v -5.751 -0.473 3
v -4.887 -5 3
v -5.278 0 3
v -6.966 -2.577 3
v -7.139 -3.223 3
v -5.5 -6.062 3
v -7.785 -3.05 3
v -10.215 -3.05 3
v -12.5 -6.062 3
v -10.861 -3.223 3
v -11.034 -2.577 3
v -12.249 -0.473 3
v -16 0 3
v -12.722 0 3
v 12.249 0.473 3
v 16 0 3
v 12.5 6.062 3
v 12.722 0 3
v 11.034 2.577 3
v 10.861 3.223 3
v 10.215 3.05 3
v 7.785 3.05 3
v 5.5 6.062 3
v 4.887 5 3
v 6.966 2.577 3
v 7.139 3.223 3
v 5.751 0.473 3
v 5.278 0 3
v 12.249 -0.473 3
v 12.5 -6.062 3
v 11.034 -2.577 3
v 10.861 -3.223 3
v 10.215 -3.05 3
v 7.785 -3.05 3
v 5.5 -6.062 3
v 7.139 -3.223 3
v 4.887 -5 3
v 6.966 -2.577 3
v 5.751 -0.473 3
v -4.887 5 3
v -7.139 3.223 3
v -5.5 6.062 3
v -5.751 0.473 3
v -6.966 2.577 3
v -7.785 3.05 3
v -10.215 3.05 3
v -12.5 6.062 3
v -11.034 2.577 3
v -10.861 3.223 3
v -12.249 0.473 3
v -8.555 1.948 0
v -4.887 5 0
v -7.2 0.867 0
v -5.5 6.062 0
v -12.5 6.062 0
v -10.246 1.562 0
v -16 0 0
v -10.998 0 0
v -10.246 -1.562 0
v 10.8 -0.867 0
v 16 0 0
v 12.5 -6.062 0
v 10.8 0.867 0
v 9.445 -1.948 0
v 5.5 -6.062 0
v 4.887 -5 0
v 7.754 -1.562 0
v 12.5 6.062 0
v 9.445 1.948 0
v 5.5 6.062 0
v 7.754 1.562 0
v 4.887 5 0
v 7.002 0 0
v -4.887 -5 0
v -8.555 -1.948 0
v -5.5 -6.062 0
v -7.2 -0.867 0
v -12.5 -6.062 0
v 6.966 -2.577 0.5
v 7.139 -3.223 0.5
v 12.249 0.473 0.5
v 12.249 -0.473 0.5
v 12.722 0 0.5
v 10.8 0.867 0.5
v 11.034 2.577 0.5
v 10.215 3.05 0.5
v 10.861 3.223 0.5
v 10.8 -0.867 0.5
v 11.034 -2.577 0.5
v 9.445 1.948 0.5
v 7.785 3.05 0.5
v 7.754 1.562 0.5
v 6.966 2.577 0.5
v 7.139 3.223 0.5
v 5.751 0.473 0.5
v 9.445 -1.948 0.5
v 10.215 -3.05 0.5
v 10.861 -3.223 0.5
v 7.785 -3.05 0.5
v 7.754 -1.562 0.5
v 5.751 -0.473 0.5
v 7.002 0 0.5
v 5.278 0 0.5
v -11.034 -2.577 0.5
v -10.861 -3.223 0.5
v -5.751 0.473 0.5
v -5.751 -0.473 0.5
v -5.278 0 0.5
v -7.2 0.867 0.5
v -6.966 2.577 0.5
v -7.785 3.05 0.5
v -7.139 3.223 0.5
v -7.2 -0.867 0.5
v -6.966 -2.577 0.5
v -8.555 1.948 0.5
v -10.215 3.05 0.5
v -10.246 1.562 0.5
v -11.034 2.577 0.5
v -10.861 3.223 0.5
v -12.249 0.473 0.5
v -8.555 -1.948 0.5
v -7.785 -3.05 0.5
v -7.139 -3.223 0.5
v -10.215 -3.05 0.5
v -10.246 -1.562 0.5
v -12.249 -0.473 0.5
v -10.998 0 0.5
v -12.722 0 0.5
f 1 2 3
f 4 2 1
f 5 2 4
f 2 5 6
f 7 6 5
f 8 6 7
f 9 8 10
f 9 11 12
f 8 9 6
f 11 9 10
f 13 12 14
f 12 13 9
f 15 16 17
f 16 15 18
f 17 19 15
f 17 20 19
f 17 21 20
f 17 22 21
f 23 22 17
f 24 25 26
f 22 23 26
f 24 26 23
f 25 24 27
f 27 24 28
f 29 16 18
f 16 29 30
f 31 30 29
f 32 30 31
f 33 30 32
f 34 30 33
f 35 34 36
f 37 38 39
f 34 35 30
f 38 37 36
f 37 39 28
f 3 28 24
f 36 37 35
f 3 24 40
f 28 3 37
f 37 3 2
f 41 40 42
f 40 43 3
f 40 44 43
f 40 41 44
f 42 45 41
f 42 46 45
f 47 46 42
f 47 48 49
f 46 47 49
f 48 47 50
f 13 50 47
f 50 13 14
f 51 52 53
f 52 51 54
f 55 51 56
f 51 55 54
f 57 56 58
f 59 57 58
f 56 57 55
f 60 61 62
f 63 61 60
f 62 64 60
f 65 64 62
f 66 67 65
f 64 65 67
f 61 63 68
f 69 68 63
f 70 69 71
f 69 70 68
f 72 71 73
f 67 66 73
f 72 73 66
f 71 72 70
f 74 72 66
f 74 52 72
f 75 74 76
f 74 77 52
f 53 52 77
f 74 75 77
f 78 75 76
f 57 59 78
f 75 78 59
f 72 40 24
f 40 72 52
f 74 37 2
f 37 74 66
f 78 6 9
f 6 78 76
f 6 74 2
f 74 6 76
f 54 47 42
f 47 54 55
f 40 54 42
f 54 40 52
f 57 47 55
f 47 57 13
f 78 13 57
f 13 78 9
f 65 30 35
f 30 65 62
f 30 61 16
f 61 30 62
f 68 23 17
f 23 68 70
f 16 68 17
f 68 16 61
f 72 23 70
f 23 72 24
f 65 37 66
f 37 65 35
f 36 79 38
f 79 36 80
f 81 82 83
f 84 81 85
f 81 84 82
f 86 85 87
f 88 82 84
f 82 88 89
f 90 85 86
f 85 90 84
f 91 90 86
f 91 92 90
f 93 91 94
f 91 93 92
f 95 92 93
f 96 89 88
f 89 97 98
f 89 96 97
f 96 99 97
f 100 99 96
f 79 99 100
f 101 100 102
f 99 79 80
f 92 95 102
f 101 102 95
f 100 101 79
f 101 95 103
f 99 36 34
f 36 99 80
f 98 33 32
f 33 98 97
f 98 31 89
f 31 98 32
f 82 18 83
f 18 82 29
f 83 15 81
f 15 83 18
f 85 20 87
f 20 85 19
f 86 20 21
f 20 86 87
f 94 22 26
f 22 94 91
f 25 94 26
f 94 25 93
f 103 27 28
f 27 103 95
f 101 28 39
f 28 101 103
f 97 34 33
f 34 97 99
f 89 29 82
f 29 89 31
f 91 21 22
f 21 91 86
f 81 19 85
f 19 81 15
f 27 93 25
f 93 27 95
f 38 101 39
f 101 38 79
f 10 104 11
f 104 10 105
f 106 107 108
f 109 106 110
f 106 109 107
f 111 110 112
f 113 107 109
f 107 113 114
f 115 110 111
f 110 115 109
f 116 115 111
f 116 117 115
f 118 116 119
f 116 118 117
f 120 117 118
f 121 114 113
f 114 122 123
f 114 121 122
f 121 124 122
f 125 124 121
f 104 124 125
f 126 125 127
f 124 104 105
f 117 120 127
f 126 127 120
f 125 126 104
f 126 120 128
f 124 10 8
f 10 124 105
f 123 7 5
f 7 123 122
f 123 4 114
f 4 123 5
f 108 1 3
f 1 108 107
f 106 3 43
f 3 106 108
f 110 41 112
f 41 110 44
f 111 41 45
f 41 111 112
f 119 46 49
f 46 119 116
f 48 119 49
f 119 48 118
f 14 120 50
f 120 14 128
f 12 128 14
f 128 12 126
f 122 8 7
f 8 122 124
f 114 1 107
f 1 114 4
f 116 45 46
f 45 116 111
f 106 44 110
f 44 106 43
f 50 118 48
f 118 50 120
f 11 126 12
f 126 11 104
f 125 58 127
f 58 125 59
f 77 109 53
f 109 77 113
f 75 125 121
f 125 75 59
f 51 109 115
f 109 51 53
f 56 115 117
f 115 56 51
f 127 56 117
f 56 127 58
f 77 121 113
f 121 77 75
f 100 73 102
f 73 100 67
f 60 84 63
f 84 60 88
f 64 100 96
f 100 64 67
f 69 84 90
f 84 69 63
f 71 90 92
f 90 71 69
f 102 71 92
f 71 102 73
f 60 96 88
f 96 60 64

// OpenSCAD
// file: functions.scad
// PRUSA Mendel  
// Functions used in many files
// GNU GPL v2
// Josef Průša
// josefprusa@me.com
// prusadjs.cz
// http://www.reprap.org/wiki/Prusa_Mendel
// http://github.com/prusajr/PrusaMendel

module nut(d,h,horizontal=true){
cornerdiameter =  (d / 2) / cos (180 / 6);
cylinder(h = h, r = cornerdiameter, $fn = 6);
if(horizontal){
for(i = [1:6]){
	rotate([0,0,60*i]) translate([-cornerdiameter-0.2,0,0]) rotate([0,0,-45]) cube(size = [2,2,h]);
}}
}

// By nophead
module polyhole(d,h) {
    n = max(round(2 * d),3);
    rotate([0,0,180])
        cylinder(h = h, r = (d / 2) / cos (180 / n), $fn = n);
}




module roundcorner(diameter){
	difference(){
		cube(size = [diameter,diameter,99], center = false);
		translate(v = [diameter, diameter, 0]) cylinder(h = 100, r=diameter, center=true);
	}
}
// file: metric.scad
// PRUSA Mendel  
// Default metric sizes
// GNU GPL v2
// Josef Průša
// josefprusa@me.com
// prusadjs.cz
// http://www.reprap.org/wiki/Prusa_Mendel
// http://github.com/prusajr/PrusaMendel

// DONT CHANGE THIS FILE! ALTER VALUES IN CONFIGURATION.SCAD INSTEAD

// RODS

threaded_rod_diameter = 8.2;
threaded_rod_diameter_horizontal = 8.2;
smooth_bar_diameter = 8;
smooth_bar_diameter_horizontal = 8.5;

// Nuts and bolts

m8_diameter = 9;
m8_nut_diameter = 16.4;

m4_diameter = 4.5;
m4_nut_diameter = 9;

m3_diameter = 3.6;
m3_nut_diameter = 6.1;

// Bushing holder

bushing_core_diameter = smooth_bar_diameter;
bushing_material_thickness = 1;

// Motors

motor_shaft = 5.5;
// file: configuration.scad
// PRUSA Mendel  
// Configuration file
// GNU GPL v2
// Josef Průša
// josefprusa@me.com
// prusadjs.cz
// http://www.reprap.org/wiki/Prusa_Mendel
// http://github.com/prusajr/PrusaMendel

// PLEASE SELECT ONE OF THE CONFIGURATIONS BELOW
// BY UN-COMMENTING IT

// Uncomment for metric settings
// METRIC METRIC METRIC METRIC METRIC METRIC METRIC METRIC 

include <metric.scad>;

// Uncomment for imperial settings
// IMPERIAL IMPERIAL IMPERIAL IMPERIAL IMPERIAL IMPERIAL IMPERIAL 

//include <sae.scad>;


// CUSTOM CUSTOM CUSTOM CUSTOM CUSTOM CUSTOM CUSTOM CUSTOM CUSTOM

thin_wall = 3;

// LM8UU
linear =0;


// CHANGE ONLY THE STUFF YOU KNOW
// IT WILL REPLACE DEFAULT SETTING

// RODS

// threaded_rod_diameter = 0;
// threaded_rod_diameter_horizontal = 0;
// smooth_bar_díameter = 0;
// smooth_bar_díameter_horizontal = 0;

// Nuts and bolts

// m8_diameter = 0;
// m8_nut_diameter = 0;

// m4_diameter = 0;
// m4_nut_diameter = 0;

// m3_diameter = 0;
// m3_nut_diameter = 0;

// Bushing holder

// bushing_core_diameter = smooth_bar_díameter;
// bushing_material_thickness = 0;


///counted stuff
m3_nut_diameter_bigger = ((m3_nut_diameter  / 2) / cos (180 / 6))*2;

// functions 
include <functions.scad>
// main file
// PRUSA Mendel  
// Belt clamp
// GNU GPL v2
// Josef Průša
// josefprusa@me.com
// prusadjs.cz
// http://www.reprap.org/wiki/Prusa_Mendel
// http://github.com/prusajr/PrusaMendel

include <configuration.scad>

/**
 * @id belt-clamp
 * @name Belt clamp
 * @category Printed
 */ 

module beltclamp(){
difference(){
	union(0){
translate(v = [0,0,1.5]) cube([18,10,3], center=true);
		translate(v = [-9, 0, 0]) cylinder(r=7,h=3, $fn=6);
		translate(v = [9, 0, 0]) cylinder(r=7,h=3, $fn=6);
}

translate(v = [9,0, 0.5]) nut(m3_nut_diameter,9);
translate(v = [-9,0, 0.5]) nut(m3_nut_diameter,9);
translate(v = [-9, 0, -1])polyhole(m3_diameter, 12);
translate(v = [9, 0, -1]) polyhole(m3_diameter, 12);
}
}
beltclamp();
